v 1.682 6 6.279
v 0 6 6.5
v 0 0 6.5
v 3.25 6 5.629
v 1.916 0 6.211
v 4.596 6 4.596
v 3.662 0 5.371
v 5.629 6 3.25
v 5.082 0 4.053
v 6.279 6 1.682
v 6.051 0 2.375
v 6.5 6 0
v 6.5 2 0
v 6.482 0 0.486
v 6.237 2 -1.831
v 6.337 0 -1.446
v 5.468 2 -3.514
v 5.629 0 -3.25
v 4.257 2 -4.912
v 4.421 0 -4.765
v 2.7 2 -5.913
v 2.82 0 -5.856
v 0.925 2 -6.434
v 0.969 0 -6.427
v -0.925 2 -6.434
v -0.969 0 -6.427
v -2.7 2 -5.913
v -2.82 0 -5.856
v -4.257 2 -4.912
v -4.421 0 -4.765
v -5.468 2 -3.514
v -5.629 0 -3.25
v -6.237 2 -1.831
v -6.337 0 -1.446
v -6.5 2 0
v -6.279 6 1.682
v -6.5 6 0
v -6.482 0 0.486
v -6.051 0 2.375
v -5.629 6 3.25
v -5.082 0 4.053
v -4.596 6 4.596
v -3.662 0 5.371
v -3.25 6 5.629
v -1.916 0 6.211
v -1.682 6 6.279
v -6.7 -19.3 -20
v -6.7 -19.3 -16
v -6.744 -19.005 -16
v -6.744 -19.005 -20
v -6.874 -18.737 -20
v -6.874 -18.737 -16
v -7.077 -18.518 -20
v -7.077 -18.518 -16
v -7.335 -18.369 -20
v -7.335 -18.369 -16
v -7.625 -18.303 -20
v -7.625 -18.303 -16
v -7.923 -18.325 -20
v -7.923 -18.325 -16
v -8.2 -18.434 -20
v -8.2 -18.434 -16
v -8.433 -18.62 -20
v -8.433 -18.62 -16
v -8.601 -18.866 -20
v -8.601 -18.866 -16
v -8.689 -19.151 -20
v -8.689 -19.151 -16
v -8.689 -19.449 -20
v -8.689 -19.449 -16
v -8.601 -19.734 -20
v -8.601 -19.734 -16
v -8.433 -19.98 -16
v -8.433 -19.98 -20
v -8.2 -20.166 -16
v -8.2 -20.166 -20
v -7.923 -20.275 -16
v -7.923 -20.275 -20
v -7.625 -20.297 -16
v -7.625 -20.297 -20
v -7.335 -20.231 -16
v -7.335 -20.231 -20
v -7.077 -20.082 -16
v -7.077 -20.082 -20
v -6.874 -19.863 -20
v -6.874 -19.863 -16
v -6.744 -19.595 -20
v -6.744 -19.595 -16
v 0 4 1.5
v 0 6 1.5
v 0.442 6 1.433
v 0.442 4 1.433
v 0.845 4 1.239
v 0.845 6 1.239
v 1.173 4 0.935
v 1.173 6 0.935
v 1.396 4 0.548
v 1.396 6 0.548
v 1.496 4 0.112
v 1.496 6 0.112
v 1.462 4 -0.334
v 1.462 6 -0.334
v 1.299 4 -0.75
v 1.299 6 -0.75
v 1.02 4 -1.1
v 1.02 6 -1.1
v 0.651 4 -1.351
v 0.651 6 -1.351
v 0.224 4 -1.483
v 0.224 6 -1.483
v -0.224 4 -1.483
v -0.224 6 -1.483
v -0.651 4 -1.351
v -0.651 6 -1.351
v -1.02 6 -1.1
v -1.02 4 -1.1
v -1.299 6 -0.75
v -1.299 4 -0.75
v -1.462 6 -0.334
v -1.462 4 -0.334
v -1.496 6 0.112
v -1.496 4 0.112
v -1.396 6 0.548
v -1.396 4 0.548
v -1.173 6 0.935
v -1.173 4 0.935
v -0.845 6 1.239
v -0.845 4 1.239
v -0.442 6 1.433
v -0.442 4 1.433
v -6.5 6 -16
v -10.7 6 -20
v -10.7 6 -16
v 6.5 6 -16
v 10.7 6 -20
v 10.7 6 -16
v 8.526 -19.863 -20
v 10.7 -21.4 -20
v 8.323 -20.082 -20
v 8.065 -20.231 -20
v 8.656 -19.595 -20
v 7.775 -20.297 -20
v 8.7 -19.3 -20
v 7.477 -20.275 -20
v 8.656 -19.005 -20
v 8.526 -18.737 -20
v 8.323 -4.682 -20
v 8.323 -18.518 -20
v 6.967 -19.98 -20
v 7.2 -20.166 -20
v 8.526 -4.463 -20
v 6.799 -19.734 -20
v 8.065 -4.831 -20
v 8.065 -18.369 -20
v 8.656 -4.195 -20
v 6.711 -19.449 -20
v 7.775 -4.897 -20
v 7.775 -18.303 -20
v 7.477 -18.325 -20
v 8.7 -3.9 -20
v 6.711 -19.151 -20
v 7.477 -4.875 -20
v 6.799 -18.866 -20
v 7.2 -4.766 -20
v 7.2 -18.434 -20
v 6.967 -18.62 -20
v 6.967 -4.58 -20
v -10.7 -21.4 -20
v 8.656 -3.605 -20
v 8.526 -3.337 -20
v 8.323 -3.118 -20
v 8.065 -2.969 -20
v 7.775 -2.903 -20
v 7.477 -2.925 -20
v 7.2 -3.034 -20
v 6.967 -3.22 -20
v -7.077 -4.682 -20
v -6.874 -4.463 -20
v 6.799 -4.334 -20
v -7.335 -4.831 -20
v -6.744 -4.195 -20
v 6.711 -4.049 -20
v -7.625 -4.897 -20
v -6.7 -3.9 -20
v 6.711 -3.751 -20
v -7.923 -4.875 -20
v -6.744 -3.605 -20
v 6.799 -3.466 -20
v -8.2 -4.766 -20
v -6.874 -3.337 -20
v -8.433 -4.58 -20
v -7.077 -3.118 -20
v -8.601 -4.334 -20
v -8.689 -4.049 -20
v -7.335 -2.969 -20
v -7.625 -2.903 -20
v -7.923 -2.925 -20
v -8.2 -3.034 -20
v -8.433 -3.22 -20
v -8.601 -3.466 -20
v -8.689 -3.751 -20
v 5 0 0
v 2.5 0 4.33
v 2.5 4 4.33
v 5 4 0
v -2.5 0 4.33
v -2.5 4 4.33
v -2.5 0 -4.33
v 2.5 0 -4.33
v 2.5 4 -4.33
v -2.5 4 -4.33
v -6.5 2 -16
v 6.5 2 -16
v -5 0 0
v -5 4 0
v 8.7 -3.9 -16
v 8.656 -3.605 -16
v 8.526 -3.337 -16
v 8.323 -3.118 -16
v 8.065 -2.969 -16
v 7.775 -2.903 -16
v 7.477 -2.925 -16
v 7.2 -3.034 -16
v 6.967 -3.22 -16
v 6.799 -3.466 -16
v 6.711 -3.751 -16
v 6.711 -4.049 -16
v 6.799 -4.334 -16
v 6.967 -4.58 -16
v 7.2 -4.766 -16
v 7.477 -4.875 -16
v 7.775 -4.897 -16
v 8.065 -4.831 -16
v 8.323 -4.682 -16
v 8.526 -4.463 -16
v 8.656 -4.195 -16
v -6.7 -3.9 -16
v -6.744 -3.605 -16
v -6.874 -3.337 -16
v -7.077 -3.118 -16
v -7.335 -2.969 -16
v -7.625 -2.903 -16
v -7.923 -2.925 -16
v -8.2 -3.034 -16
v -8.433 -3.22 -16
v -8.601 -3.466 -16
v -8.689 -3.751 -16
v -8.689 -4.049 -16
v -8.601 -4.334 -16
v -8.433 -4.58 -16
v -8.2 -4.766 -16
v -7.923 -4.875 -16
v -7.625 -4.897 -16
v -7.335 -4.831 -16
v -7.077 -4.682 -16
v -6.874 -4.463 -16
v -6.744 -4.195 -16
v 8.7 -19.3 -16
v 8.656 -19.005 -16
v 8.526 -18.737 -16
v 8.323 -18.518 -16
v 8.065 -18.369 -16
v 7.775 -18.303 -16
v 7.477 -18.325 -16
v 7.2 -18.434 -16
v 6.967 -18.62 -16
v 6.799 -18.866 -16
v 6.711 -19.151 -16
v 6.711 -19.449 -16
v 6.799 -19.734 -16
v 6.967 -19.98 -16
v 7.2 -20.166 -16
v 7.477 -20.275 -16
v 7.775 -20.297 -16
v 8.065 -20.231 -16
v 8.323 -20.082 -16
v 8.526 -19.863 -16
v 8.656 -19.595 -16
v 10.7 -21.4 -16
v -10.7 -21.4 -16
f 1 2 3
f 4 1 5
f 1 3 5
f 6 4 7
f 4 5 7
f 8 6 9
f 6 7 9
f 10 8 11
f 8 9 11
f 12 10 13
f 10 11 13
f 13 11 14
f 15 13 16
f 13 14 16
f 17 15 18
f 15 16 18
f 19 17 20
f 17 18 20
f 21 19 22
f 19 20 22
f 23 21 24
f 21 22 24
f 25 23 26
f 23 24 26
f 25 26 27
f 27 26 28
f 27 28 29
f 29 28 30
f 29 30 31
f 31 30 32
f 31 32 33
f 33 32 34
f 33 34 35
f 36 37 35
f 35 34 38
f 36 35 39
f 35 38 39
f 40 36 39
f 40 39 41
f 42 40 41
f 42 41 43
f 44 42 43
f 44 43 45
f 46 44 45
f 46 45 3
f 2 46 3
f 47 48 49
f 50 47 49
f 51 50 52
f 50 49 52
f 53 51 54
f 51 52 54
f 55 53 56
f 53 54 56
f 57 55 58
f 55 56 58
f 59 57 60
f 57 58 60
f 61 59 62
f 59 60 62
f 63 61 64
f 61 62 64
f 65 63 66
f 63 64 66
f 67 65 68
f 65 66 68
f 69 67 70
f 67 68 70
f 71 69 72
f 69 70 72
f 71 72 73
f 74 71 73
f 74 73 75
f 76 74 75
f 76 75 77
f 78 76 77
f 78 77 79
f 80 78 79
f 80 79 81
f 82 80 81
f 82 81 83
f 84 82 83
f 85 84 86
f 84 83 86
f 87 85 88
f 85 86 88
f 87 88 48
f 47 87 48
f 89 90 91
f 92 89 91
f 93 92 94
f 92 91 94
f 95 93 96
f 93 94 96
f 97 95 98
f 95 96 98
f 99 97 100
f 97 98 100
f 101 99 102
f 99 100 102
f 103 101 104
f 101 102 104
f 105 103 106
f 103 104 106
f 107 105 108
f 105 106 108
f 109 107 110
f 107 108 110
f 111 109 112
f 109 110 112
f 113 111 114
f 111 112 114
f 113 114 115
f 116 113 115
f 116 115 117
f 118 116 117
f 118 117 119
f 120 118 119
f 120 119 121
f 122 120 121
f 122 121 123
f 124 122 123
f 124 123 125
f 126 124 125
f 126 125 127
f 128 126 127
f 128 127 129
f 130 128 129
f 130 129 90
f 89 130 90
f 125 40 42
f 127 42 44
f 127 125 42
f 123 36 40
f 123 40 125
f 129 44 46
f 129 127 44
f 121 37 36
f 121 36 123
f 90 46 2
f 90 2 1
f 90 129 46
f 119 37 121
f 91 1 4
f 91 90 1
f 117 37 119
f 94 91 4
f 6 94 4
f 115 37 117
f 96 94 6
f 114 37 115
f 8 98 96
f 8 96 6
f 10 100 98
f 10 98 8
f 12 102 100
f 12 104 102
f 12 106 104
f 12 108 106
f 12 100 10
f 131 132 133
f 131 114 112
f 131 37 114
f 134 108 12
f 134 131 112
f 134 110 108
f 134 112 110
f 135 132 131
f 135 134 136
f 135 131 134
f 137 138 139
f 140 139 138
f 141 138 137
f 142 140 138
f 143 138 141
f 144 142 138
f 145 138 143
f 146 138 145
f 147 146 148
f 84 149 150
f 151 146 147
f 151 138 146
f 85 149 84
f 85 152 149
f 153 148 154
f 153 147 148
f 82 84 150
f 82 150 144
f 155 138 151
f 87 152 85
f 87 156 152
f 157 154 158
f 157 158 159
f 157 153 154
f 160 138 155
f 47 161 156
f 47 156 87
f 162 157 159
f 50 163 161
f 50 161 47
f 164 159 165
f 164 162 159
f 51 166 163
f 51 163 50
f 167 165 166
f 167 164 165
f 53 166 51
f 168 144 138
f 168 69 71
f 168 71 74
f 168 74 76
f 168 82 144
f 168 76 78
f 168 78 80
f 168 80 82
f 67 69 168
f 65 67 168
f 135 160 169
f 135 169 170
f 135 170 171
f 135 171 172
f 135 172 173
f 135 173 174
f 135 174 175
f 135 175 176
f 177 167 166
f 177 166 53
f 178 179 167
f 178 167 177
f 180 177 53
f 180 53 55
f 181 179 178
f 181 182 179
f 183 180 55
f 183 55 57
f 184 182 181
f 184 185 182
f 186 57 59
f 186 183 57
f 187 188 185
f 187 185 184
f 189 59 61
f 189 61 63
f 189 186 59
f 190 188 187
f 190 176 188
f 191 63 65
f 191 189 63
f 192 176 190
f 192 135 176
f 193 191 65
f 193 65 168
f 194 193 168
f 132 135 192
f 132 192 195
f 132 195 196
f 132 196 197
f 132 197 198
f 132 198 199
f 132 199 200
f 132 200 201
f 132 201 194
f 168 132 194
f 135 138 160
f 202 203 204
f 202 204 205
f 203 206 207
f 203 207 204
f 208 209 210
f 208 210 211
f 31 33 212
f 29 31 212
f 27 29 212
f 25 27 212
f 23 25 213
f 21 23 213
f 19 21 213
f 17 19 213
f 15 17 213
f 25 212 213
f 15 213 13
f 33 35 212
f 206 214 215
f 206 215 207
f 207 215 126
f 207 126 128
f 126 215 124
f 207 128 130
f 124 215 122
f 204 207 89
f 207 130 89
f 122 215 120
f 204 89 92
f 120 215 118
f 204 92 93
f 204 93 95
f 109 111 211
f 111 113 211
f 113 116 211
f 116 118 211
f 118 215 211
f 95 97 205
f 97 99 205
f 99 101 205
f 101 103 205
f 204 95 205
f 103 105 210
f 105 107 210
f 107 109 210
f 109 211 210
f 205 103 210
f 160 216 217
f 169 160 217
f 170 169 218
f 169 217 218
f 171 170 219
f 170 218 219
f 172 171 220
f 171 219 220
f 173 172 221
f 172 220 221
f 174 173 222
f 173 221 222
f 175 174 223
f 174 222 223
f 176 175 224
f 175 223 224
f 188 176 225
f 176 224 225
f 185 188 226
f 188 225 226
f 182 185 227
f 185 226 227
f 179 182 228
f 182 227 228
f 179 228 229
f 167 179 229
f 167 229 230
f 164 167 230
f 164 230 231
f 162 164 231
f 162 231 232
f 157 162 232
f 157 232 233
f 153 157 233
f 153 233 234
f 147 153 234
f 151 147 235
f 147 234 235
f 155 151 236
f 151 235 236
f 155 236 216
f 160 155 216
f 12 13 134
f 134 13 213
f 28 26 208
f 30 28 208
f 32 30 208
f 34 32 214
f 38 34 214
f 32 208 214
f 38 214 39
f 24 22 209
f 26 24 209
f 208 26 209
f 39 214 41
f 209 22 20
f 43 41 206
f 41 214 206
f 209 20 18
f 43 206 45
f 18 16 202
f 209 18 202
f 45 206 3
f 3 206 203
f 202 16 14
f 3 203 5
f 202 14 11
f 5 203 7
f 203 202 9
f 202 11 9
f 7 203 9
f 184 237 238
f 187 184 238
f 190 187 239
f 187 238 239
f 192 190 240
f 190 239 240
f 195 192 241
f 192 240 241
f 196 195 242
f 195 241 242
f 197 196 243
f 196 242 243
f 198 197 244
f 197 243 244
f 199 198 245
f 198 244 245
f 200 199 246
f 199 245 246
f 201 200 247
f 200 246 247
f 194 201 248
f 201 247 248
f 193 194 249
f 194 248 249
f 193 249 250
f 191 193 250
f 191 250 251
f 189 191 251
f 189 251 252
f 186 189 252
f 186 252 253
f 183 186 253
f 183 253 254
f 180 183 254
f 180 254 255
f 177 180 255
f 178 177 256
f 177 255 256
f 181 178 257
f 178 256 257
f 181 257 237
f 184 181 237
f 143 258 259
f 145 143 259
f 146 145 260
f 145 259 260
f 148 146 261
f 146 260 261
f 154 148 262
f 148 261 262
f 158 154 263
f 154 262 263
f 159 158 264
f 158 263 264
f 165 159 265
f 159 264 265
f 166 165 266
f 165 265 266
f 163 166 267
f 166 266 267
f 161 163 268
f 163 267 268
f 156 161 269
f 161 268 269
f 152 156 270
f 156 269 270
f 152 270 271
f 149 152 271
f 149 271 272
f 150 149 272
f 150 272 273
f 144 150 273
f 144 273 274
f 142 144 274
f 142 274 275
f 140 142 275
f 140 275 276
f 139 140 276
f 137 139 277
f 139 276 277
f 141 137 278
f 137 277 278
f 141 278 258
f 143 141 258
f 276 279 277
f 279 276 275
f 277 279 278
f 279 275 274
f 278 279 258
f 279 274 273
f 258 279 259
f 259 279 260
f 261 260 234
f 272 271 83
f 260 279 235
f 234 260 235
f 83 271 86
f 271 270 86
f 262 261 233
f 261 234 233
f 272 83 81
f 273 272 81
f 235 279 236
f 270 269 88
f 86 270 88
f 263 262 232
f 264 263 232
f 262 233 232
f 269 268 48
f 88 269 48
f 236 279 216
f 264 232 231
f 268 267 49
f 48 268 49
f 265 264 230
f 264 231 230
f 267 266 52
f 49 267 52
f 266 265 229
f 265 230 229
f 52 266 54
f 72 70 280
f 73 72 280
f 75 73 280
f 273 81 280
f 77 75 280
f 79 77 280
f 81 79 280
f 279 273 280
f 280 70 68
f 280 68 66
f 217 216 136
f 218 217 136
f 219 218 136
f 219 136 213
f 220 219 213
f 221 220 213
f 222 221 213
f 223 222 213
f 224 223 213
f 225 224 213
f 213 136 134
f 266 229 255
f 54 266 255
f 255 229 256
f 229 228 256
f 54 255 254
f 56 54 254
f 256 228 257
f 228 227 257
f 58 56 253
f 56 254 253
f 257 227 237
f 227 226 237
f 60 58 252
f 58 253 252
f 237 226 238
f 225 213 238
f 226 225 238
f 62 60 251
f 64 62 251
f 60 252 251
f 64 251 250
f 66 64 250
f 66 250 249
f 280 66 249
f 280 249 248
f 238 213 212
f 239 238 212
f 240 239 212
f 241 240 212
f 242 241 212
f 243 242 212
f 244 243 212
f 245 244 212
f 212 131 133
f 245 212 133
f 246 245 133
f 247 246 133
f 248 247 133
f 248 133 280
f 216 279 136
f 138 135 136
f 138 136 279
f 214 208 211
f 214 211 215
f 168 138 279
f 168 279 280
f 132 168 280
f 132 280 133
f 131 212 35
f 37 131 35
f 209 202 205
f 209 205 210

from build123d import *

# Parameters (mm, degrees)
SKETCH_2_R           = 6.5
EXTRUDE_1_DEPTH      = 6
CUT_EXTRUDE_1_DEPTH  = 4
SKETCH_3_R           = 1.5
CUT_EXTRUDE_2_DEPTH  = 4
EXTRUDE_START        = -4
EXTRUDE_2_DEPTH      = 4
EXTRUDE_6_DEPTH      = 4
SKETCH_17_R          = 1
CUT_EXTRUDE_11_DEPTH = 4


with BuildPart() as part:
    # 草图2 → 凸台-拉伸1 (new body)
    with BuildSketch(Plane(origin=(0, 0, 0), x_dir=(1, 0, 0), z_dir=(0, 1, 0))):
        with Locations(Location((0, 0, 0), (0, 0, 270))):
            Circle(SKETCH_2_R)
    extrude(amount=EXTRUDE_1_DEPTH)

    # 草图1 → 切除-拉伸1 (cut)
    with BuildSketch(Plane(origin=(0, 0, 0), x_dir=(1, 0, 0), z_dir=(0, 1, 0))):
        Polygon((5, 0), (2.5, 4.330127019), (-2.5, 4.330127019), (-5, 0), (-2.5, -4.330127019), (2.5, -4.330127019), align=None)
    extrude(amount=CUT_EXTRUDE_1_DEPTH, mode=Mode.SUBTRACT)

    # 草图3 → 切除-拉伸2 (cut)
    with BuildSketch(Plane(origin=(0, 6, 0), x_dir=(1, 0, 0), z_dir=(0, 1, 0))):
        with Locations(Location((0, 0, 0), (0, 0, 270))):
            Circle(SKETCH_3_R)
    extrude(amount=-CUT_EXTRUDE_2_DEPTH, mode=Mode.SUBTRACT)

    # 草图4 → 凸台-拉伸2 (add)
    with BuildSketch(Plane(origin=(0, 6, 0), x_dir=(1, 0, 0), z_dir=(0, 1, 0)).offset(EXTRUDE_START)):
        with BuildLine():
            Line((6.5, 0), (6.5, 20))
            Line((6.5, 20), (4, 20))
            Line((4, 20), (-4, 20))
            Line((-4, 20), (-6.5, 20))
            Line((-6.5, 20), (-6.5, 0))
            ThreePointArc((-6.5, 0), (0, 6.5), (6.5, 0))
        make_face()
    extrude(amount=EXTRUDE_2_DEPTH)

    # 草图6 → 凸台-拉伸6 (add)
    with BuildSketch(Plane(origin=(0, 0, -20), x_dir=(-1, 0, 0), z_dir=(0, 0, -1))):
        Polygon((10.7, -14.240758791), (10.7, 6), (-10.7, 6), (-10.7, -21.4), (10.7, -21.4), align=None)
    extrude(amount=-EXTRUDE_6_DEPTH)

    # 草图17 → 切除-拉伸11 (cut)
    with BuildSketch(Plane.XY.offset(-16)):
        with Locations((-7.7, -19.3)):
            Circle(SKETCH_17_R)
        with Locations((7.7, -19.3)):
            Circle(SKETCH_17_R)
        with Locations((7.7, -3.9)):
            Circle(SKETCH_17_R)
        with Locations((-7.7, -3.9)):
            Circle(SKETCH_17_R)
    extrude(amount=-CUT_EXTRUDE_11_DEPTH, mode=Mode.SUBTRACT)


solid = part.part
